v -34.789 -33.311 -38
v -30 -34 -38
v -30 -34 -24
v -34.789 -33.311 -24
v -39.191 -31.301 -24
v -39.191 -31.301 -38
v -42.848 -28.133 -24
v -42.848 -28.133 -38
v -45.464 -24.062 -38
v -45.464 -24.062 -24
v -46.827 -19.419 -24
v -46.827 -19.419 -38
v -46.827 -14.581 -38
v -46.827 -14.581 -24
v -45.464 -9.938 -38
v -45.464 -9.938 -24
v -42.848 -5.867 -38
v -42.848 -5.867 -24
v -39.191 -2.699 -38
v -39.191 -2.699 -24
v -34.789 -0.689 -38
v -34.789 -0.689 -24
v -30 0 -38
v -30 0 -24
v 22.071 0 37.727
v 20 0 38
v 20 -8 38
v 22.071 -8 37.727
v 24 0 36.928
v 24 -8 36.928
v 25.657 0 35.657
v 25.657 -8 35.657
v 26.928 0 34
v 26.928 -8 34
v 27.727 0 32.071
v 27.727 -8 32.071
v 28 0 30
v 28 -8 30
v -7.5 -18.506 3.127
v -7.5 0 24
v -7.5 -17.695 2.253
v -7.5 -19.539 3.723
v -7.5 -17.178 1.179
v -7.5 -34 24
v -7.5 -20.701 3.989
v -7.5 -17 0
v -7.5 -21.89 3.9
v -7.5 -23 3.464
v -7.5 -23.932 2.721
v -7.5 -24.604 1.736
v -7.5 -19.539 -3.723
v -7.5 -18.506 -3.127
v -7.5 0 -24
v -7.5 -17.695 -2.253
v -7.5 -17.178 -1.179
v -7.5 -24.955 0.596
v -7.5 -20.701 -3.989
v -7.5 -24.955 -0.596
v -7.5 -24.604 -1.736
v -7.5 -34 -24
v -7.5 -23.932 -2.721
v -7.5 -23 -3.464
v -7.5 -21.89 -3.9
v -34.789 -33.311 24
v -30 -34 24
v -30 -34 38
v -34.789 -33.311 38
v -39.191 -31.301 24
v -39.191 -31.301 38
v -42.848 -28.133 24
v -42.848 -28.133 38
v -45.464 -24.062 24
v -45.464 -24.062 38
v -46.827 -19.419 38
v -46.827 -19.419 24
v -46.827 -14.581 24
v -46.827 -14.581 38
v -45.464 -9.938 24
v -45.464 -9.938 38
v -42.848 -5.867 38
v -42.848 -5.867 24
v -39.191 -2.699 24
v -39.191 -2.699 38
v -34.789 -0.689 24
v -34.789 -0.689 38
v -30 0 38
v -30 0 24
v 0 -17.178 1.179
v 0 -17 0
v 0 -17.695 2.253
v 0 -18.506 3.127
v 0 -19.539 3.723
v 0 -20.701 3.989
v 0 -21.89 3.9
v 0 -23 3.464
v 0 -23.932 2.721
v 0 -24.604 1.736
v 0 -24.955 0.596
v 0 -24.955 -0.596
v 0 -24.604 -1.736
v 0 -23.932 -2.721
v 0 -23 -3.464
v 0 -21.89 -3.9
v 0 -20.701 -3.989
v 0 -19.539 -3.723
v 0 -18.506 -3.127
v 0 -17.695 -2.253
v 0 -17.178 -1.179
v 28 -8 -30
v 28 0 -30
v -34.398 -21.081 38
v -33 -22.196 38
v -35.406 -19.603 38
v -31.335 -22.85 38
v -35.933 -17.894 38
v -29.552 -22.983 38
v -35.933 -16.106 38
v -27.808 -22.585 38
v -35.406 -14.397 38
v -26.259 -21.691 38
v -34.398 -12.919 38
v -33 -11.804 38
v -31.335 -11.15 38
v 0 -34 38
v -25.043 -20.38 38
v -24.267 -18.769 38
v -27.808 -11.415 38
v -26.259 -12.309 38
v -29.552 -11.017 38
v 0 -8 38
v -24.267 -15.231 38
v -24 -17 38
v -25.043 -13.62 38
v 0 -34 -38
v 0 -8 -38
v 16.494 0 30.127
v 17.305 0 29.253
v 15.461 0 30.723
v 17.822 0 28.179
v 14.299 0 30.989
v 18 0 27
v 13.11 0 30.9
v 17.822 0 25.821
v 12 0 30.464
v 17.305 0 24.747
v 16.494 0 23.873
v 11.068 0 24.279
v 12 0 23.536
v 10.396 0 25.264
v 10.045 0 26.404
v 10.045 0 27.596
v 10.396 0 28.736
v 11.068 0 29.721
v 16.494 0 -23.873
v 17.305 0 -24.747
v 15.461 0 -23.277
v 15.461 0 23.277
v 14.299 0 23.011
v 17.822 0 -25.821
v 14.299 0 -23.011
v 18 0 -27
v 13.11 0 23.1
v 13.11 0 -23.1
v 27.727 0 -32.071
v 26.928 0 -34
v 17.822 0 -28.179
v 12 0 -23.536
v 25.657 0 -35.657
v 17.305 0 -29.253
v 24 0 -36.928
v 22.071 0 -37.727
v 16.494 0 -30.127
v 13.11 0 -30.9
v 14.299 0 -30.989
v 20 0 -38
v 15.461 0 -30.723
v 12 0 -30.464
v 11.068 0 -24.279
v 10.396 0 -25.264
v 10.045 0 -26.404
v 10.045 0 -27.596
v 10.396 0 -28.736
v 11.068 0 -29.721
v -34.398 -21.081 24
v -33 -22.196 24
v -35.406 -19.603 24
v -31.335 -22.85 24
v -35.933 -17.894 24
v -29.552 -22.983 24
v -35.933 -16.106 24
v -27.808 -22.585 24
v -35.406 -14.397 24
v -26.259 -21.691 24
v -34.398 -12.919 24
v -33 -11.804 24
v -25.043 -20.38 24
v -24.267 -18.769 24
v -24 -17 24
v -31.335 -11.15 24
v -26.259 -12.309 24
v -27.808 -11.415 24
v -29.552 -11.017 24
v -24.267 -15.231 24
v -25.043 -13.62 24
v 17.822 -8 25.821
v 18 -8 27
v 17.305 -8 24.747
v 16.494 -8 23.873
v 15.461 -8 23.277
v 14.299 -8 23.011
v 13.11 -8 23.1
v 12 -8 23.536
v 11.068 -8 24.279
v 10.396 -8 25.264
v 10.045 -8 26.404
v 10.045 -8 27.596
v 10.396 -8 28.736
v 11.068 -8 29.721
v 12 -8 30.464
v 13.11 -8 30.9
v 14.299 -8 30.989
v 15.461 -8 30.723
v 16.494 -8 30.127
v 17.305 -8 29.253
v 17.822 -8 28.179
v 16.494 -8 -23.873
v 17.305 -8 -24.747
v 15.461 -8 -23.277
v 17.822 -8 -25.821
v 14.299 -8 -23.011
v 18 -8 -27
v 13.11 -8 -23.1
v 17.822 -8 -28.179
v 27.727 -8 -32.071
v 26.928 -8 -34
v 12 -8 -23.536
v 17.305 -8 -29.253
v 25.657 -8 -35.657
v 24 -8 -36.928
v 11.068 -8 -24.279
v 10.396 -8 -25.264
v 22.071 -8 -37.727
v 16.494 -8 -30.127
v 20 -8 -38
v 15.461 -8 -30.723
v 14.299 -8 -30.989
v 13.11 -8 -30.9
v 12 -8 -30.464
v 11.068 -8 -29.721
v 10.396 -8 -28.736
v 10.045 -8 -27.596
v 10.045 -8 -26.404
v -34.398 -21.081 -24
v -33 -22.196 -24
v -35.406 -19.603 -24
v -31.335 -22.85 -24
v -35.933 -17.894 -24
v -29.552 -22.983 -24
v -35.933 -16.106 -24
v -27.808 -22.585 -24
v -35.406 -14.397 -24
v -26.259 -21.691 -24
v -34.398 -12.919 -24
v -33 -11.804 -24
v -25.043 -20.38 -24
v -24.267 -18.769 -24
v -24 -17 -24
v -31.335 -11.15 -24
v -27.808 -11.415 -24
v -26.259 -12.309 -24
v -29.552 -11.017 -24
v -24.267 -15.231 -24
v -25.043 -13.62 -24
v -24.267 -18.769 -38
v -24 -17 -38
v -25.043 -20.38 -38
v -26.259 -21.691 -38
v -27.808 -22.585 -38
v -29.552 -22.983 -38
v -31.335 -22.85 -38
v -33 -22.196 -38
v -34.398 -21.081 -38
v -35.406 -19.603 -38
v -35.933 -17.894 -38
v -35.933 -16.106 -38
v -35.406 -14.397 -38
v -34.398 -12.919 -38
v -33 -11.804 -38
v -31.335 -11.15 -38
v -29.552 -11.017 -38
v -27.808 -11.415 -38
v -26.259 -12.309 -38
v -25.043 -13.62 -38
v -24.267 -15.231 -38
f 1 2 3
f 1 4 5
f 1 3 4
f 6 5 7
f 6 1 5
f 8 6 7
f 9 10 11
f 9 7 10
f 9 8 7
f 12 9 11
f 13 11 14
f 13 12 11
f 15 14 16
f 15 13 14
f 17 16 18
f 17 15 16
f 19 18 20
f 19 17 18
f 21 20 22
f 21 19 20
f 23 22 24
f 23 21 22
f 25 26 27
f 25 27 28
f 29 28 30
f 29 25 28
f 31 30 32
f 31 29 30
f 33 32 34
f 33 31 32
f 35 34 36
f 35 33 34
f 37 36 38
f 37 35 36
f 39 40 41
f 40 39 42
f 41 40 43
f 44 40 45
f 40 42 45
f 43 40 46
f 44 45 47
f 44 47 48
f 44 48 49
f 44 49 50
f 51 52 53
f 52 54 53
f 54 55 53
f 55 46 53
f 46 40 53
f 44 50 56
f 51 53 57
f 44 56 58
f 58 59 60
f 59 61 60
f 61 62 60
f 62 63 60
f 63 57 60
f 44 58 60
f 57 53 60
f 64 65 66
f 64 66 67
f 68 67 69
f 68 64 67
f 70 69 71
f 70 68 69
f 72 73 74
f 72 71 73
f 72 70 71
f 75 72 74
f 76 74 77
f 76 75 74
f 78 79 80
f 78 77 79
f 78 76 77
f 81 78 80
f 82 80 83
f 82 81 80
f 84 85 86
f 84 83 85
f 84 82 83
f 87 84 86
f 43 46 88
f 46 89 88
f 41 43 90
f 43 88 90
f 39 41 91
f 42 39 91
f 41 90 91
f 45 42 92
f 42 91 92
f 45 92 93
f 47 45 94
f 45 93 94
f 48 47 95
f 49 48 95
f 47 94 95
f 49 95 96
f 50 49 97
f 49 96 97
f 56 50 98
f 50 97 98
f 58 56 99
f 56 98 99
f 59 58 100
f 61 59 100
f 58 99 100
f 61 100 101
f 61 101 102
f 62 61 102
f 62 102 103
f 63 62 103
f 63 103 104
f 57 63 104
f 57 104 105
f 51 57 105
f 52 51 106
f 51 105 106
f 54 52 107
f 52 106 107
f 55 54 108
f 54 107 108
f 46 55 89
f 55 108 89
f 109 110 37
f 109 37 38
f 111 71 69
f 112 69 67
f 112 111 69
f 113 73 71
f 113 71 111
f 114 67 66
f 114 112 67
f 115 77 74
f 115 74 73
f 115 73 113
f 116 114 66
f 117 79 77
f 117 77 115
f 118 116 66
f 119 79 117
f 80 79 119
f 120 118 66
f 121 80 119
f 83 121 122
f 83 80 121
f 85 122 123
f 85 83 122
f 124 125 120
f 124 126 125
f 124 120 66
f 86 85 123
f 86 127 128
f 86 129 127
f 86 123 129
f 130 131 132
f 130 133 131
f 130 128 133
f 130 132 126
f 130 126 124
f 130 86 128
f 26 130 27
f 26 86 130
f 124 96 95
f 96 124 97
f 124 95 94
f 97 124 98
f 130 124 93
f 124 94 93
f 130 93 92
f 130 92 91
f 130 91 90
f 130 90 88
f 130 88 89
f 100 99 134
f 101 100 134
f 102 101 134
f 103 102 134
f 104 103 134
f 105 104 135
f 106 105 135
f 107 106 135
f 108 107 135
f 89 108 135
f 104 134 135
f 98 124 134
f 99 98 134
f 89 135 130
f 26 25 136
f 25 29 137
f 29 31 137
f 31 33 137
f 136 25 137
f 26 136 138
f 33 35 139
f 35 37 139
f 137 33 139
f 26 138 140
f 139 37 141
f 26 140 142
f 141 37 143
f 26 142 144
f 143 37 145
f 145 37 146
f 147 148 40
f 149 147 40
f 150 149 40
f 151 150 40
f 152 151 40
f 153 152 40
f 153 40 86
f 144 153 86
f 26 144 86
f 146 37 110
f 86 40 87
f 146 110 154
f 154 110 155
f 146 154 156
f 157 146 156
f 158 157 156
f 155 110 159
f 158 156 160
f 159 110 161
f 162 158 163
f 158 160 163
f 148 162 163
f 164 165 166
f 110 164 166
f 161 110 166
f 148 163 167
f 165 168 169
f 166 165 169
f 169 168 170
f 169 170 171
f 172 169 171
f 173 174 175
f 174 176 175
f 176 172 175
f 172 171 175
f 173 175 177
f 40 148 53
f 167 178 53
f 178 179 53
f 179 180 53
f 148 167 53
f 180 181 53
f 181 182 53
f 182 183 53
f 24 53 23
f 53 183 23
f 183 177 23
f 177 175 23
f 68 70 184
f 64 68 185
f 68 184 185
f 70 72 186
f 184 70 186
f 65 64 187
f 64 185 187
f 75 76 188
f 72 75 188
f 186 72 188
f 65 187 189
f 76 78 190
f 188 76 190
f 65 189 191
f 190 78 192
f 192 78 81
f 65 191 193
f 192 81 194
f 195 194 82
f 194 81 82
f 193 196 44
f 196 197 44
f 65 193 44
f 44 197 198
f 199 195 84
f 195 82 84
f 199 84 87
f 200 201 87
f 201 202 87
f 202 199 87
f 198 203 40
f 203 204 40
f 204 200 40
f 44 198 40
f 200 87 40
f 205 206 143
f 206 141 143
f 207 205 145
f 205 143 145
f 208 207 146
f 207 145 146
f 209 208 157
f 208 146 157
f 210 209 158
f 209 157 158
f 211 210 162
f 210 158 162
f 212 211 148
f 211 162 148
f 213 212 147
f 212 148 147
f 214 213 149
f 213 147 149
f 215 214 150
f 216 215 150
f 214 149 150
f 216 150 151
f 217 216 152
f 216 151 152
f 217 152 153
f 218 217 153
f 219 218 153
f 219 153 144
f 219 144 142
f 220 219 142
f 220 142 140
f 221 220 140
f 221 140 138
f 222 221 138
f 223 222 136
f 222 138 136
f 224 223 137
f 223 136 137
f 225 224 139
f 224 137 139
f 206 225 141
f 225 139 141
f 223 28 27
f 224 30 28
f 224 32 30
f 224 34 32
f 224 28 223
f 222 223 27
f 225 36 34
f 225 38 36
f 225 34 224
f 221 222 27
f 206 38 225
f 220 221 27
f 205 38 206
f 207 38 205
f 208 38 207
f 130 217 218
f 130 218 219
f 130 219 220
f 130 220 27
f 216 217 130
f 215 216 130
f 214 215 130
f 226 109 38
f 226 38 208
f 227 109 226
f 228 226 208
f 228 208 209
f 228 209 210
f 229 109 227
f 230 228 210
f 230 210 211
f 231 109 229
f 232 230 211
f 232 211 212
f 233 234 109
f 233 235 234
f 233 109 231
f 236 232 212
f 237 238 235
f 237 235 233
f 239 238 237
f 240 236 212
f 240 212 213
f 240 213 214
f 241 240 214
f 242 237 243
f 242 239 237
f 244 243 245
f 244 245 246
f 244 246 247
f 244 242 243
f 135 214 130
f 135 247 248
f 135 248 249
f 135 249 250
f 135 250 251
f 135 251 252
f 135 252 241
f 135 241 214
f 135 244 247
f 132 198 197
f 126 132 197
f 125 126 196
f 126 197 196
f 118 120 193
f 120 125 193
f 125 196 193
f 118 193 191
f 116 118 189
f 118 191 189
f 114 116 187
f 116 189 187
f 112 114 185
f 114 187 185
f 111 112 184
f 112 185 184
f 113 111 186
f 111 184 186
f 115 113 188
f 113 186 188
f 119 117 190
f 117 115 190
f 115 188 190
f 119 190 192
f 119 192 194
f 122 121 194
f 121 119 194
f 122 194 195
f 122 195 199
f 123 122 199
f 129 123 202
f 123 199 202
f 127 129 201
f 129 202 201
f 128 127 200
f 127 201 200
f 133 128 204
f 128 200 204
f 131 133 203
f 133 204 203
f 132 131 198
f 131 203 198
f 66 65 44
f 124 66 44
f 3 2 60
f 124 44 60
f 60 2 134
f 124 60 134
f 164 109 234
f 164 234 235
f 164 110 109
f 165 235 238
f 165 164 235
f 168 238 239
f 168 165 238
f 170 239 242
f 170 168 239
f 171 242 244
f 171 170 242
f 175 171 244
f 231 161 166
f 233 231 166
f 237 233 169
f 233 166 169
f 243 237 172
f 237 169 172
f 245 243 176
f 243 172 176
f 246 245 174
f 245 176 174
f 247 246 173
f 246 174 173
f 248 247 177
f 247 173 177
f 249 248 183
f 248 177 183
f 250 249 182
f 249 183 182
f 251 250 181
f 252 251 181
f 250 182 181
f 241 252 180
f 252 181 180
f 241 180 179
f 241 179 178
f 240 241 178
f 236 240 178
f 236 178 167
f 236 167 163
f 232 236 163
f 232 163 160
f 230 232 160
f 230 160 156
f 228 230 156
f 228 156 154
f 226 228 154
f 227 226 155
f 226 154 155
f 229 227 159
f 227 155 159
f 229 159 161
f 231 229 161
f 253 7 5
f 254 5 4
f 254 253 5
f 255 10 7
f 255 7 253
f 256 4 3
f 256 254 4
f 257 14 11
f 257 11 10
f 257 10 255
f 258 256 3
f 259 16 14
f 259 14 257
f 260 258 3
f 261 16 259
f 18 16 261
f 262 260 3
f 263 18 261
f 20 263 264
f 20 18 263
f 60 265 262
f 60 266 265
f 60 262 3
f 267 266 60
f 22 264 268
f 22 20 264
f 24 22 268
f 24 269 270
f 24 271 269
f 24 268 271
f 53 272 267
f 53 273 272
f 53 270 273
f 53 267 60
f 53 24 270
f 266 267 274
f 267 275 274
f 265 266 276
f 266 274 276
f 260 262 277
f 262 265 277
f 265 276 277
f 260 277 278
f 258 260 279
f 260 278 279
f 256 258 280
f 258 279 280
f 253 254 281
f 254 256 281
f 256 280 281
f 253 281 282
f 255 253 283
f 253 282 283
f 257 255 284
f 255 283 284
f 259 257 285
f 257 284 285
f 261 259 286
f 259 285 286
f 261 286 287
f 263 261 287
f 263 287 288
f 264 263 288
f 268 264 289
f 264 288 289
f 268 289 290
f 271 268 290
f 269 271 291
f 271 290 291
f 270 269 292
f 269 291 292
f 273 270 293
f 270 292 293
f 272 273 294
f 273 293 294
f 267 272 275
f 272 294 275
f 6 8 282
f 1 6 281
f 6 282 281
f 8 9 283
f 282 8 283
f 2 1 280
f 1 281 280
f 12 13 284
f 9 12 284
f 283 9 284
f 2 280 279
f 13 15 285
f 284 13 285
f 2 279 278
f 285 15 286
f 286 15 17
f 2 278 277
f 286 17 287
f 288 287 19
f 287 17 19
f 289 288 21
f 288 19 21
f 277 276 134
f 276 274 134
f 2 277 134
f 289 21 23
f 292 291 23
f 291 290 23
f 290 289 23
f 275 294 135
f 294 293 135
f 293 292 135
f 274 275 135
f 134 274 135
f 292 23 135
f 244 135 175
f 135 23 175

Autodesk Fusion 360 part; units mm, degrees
sketch "Sketch1" plane through (0, 0, 0) normal (0, 0, 1) x (1, 0, 0)
  line L0 (0, 0) -> (-30, 0)
  line L1 (-30, -34) -> (0, -34)
  line L2 (0, -34) -> (0, 0)
  line L3 (0, 0) -> (28, 0)
  line L4 (28, 0) -> (28, -8)
  line L5 (28, -8) -> (0, -8)
  line L6 (0, -8) -> (0, 0)
  arc A0 (-30, 0) -> (-30, -34) centre (-30, -17) ccw
  circle A1 centre (-30, -17) radius 6
  line L7 (-7.5, 0) -> (-7.5, -34)
  dimension "d2" = 28
  dimension "d3" = 8
  dimension "d4" = 34
  dimension "d5" = 34
  dimension "d6" = 17
  dimension "d7" = 12
  dimension "d8" = 30
  dimension "d9" = 7.5
sketch "Sketch2" plane through (0, 0, 0) normal (0, 1, 0) x (1, 0, 0)
  circle A0 centre (14, -27) radius 4
  line L0 (20, -38) -> (28, -38)
  line L1 (28, -38) -> (28, -30)
  arc A1 (20, -38) -> (28, -30) centre (20, -30) ccw
  dimension "d18" = 8
  dimension "d19" = 27
  dimension "d20" = 14
  dimension "d29" = 16
  dimension "d30" = 38
  dimension "d31" = 28
sketch "Sketch3" plane through (0, 0, 0) normal (1, 0, 0) x (0, 1, 0)
  circle A0 centre (-21, 0) radius 4
  line L0 (0, 0) -> (-21, 0) construction
  dimension "d22" = 8
  dimension "d23" = 21
extrude "Extrude1" add sketch "Sketch1" along normal blind 38 and the other way blind 38
extrude "Extrude2" cut sketch "Sketch1" along normal blind 24 and the other way blind 24 contours L0 L1 A0 L7
extrude "Extrude3" cut sketch "Sketch2" against normal through all
extrude "Extrude4" cut sketch "Sketch3" against normal through all
mirror "Mirror1" about plane through (0, 0, 0) normal (0, 0, 1) of "Extrude3"
equation "d4 = ( 17 * 2 ) * 1 mm"
equation "d5 = ( 17 * 2 ) * 1 mm"
equation "d10 = ( 76 / 2 ) * 1 mm"
equation "d12 = ( 76 / 2 ) * 1 mm"
equation "d14 = ( 76 / 2 ) * 1 mm - 14 mm"
equation "d16 = ( 76 / 2 ) * 1 mm - 14 mm"
equation "d19 = ( 76 / 2 ) * 1 mm - 11 mm"
equation "d23 = ( 17 * 2 ) * 1 mm - 13 mm"
equation "d30 = ( 76 / 2 ) * 1 mm"
